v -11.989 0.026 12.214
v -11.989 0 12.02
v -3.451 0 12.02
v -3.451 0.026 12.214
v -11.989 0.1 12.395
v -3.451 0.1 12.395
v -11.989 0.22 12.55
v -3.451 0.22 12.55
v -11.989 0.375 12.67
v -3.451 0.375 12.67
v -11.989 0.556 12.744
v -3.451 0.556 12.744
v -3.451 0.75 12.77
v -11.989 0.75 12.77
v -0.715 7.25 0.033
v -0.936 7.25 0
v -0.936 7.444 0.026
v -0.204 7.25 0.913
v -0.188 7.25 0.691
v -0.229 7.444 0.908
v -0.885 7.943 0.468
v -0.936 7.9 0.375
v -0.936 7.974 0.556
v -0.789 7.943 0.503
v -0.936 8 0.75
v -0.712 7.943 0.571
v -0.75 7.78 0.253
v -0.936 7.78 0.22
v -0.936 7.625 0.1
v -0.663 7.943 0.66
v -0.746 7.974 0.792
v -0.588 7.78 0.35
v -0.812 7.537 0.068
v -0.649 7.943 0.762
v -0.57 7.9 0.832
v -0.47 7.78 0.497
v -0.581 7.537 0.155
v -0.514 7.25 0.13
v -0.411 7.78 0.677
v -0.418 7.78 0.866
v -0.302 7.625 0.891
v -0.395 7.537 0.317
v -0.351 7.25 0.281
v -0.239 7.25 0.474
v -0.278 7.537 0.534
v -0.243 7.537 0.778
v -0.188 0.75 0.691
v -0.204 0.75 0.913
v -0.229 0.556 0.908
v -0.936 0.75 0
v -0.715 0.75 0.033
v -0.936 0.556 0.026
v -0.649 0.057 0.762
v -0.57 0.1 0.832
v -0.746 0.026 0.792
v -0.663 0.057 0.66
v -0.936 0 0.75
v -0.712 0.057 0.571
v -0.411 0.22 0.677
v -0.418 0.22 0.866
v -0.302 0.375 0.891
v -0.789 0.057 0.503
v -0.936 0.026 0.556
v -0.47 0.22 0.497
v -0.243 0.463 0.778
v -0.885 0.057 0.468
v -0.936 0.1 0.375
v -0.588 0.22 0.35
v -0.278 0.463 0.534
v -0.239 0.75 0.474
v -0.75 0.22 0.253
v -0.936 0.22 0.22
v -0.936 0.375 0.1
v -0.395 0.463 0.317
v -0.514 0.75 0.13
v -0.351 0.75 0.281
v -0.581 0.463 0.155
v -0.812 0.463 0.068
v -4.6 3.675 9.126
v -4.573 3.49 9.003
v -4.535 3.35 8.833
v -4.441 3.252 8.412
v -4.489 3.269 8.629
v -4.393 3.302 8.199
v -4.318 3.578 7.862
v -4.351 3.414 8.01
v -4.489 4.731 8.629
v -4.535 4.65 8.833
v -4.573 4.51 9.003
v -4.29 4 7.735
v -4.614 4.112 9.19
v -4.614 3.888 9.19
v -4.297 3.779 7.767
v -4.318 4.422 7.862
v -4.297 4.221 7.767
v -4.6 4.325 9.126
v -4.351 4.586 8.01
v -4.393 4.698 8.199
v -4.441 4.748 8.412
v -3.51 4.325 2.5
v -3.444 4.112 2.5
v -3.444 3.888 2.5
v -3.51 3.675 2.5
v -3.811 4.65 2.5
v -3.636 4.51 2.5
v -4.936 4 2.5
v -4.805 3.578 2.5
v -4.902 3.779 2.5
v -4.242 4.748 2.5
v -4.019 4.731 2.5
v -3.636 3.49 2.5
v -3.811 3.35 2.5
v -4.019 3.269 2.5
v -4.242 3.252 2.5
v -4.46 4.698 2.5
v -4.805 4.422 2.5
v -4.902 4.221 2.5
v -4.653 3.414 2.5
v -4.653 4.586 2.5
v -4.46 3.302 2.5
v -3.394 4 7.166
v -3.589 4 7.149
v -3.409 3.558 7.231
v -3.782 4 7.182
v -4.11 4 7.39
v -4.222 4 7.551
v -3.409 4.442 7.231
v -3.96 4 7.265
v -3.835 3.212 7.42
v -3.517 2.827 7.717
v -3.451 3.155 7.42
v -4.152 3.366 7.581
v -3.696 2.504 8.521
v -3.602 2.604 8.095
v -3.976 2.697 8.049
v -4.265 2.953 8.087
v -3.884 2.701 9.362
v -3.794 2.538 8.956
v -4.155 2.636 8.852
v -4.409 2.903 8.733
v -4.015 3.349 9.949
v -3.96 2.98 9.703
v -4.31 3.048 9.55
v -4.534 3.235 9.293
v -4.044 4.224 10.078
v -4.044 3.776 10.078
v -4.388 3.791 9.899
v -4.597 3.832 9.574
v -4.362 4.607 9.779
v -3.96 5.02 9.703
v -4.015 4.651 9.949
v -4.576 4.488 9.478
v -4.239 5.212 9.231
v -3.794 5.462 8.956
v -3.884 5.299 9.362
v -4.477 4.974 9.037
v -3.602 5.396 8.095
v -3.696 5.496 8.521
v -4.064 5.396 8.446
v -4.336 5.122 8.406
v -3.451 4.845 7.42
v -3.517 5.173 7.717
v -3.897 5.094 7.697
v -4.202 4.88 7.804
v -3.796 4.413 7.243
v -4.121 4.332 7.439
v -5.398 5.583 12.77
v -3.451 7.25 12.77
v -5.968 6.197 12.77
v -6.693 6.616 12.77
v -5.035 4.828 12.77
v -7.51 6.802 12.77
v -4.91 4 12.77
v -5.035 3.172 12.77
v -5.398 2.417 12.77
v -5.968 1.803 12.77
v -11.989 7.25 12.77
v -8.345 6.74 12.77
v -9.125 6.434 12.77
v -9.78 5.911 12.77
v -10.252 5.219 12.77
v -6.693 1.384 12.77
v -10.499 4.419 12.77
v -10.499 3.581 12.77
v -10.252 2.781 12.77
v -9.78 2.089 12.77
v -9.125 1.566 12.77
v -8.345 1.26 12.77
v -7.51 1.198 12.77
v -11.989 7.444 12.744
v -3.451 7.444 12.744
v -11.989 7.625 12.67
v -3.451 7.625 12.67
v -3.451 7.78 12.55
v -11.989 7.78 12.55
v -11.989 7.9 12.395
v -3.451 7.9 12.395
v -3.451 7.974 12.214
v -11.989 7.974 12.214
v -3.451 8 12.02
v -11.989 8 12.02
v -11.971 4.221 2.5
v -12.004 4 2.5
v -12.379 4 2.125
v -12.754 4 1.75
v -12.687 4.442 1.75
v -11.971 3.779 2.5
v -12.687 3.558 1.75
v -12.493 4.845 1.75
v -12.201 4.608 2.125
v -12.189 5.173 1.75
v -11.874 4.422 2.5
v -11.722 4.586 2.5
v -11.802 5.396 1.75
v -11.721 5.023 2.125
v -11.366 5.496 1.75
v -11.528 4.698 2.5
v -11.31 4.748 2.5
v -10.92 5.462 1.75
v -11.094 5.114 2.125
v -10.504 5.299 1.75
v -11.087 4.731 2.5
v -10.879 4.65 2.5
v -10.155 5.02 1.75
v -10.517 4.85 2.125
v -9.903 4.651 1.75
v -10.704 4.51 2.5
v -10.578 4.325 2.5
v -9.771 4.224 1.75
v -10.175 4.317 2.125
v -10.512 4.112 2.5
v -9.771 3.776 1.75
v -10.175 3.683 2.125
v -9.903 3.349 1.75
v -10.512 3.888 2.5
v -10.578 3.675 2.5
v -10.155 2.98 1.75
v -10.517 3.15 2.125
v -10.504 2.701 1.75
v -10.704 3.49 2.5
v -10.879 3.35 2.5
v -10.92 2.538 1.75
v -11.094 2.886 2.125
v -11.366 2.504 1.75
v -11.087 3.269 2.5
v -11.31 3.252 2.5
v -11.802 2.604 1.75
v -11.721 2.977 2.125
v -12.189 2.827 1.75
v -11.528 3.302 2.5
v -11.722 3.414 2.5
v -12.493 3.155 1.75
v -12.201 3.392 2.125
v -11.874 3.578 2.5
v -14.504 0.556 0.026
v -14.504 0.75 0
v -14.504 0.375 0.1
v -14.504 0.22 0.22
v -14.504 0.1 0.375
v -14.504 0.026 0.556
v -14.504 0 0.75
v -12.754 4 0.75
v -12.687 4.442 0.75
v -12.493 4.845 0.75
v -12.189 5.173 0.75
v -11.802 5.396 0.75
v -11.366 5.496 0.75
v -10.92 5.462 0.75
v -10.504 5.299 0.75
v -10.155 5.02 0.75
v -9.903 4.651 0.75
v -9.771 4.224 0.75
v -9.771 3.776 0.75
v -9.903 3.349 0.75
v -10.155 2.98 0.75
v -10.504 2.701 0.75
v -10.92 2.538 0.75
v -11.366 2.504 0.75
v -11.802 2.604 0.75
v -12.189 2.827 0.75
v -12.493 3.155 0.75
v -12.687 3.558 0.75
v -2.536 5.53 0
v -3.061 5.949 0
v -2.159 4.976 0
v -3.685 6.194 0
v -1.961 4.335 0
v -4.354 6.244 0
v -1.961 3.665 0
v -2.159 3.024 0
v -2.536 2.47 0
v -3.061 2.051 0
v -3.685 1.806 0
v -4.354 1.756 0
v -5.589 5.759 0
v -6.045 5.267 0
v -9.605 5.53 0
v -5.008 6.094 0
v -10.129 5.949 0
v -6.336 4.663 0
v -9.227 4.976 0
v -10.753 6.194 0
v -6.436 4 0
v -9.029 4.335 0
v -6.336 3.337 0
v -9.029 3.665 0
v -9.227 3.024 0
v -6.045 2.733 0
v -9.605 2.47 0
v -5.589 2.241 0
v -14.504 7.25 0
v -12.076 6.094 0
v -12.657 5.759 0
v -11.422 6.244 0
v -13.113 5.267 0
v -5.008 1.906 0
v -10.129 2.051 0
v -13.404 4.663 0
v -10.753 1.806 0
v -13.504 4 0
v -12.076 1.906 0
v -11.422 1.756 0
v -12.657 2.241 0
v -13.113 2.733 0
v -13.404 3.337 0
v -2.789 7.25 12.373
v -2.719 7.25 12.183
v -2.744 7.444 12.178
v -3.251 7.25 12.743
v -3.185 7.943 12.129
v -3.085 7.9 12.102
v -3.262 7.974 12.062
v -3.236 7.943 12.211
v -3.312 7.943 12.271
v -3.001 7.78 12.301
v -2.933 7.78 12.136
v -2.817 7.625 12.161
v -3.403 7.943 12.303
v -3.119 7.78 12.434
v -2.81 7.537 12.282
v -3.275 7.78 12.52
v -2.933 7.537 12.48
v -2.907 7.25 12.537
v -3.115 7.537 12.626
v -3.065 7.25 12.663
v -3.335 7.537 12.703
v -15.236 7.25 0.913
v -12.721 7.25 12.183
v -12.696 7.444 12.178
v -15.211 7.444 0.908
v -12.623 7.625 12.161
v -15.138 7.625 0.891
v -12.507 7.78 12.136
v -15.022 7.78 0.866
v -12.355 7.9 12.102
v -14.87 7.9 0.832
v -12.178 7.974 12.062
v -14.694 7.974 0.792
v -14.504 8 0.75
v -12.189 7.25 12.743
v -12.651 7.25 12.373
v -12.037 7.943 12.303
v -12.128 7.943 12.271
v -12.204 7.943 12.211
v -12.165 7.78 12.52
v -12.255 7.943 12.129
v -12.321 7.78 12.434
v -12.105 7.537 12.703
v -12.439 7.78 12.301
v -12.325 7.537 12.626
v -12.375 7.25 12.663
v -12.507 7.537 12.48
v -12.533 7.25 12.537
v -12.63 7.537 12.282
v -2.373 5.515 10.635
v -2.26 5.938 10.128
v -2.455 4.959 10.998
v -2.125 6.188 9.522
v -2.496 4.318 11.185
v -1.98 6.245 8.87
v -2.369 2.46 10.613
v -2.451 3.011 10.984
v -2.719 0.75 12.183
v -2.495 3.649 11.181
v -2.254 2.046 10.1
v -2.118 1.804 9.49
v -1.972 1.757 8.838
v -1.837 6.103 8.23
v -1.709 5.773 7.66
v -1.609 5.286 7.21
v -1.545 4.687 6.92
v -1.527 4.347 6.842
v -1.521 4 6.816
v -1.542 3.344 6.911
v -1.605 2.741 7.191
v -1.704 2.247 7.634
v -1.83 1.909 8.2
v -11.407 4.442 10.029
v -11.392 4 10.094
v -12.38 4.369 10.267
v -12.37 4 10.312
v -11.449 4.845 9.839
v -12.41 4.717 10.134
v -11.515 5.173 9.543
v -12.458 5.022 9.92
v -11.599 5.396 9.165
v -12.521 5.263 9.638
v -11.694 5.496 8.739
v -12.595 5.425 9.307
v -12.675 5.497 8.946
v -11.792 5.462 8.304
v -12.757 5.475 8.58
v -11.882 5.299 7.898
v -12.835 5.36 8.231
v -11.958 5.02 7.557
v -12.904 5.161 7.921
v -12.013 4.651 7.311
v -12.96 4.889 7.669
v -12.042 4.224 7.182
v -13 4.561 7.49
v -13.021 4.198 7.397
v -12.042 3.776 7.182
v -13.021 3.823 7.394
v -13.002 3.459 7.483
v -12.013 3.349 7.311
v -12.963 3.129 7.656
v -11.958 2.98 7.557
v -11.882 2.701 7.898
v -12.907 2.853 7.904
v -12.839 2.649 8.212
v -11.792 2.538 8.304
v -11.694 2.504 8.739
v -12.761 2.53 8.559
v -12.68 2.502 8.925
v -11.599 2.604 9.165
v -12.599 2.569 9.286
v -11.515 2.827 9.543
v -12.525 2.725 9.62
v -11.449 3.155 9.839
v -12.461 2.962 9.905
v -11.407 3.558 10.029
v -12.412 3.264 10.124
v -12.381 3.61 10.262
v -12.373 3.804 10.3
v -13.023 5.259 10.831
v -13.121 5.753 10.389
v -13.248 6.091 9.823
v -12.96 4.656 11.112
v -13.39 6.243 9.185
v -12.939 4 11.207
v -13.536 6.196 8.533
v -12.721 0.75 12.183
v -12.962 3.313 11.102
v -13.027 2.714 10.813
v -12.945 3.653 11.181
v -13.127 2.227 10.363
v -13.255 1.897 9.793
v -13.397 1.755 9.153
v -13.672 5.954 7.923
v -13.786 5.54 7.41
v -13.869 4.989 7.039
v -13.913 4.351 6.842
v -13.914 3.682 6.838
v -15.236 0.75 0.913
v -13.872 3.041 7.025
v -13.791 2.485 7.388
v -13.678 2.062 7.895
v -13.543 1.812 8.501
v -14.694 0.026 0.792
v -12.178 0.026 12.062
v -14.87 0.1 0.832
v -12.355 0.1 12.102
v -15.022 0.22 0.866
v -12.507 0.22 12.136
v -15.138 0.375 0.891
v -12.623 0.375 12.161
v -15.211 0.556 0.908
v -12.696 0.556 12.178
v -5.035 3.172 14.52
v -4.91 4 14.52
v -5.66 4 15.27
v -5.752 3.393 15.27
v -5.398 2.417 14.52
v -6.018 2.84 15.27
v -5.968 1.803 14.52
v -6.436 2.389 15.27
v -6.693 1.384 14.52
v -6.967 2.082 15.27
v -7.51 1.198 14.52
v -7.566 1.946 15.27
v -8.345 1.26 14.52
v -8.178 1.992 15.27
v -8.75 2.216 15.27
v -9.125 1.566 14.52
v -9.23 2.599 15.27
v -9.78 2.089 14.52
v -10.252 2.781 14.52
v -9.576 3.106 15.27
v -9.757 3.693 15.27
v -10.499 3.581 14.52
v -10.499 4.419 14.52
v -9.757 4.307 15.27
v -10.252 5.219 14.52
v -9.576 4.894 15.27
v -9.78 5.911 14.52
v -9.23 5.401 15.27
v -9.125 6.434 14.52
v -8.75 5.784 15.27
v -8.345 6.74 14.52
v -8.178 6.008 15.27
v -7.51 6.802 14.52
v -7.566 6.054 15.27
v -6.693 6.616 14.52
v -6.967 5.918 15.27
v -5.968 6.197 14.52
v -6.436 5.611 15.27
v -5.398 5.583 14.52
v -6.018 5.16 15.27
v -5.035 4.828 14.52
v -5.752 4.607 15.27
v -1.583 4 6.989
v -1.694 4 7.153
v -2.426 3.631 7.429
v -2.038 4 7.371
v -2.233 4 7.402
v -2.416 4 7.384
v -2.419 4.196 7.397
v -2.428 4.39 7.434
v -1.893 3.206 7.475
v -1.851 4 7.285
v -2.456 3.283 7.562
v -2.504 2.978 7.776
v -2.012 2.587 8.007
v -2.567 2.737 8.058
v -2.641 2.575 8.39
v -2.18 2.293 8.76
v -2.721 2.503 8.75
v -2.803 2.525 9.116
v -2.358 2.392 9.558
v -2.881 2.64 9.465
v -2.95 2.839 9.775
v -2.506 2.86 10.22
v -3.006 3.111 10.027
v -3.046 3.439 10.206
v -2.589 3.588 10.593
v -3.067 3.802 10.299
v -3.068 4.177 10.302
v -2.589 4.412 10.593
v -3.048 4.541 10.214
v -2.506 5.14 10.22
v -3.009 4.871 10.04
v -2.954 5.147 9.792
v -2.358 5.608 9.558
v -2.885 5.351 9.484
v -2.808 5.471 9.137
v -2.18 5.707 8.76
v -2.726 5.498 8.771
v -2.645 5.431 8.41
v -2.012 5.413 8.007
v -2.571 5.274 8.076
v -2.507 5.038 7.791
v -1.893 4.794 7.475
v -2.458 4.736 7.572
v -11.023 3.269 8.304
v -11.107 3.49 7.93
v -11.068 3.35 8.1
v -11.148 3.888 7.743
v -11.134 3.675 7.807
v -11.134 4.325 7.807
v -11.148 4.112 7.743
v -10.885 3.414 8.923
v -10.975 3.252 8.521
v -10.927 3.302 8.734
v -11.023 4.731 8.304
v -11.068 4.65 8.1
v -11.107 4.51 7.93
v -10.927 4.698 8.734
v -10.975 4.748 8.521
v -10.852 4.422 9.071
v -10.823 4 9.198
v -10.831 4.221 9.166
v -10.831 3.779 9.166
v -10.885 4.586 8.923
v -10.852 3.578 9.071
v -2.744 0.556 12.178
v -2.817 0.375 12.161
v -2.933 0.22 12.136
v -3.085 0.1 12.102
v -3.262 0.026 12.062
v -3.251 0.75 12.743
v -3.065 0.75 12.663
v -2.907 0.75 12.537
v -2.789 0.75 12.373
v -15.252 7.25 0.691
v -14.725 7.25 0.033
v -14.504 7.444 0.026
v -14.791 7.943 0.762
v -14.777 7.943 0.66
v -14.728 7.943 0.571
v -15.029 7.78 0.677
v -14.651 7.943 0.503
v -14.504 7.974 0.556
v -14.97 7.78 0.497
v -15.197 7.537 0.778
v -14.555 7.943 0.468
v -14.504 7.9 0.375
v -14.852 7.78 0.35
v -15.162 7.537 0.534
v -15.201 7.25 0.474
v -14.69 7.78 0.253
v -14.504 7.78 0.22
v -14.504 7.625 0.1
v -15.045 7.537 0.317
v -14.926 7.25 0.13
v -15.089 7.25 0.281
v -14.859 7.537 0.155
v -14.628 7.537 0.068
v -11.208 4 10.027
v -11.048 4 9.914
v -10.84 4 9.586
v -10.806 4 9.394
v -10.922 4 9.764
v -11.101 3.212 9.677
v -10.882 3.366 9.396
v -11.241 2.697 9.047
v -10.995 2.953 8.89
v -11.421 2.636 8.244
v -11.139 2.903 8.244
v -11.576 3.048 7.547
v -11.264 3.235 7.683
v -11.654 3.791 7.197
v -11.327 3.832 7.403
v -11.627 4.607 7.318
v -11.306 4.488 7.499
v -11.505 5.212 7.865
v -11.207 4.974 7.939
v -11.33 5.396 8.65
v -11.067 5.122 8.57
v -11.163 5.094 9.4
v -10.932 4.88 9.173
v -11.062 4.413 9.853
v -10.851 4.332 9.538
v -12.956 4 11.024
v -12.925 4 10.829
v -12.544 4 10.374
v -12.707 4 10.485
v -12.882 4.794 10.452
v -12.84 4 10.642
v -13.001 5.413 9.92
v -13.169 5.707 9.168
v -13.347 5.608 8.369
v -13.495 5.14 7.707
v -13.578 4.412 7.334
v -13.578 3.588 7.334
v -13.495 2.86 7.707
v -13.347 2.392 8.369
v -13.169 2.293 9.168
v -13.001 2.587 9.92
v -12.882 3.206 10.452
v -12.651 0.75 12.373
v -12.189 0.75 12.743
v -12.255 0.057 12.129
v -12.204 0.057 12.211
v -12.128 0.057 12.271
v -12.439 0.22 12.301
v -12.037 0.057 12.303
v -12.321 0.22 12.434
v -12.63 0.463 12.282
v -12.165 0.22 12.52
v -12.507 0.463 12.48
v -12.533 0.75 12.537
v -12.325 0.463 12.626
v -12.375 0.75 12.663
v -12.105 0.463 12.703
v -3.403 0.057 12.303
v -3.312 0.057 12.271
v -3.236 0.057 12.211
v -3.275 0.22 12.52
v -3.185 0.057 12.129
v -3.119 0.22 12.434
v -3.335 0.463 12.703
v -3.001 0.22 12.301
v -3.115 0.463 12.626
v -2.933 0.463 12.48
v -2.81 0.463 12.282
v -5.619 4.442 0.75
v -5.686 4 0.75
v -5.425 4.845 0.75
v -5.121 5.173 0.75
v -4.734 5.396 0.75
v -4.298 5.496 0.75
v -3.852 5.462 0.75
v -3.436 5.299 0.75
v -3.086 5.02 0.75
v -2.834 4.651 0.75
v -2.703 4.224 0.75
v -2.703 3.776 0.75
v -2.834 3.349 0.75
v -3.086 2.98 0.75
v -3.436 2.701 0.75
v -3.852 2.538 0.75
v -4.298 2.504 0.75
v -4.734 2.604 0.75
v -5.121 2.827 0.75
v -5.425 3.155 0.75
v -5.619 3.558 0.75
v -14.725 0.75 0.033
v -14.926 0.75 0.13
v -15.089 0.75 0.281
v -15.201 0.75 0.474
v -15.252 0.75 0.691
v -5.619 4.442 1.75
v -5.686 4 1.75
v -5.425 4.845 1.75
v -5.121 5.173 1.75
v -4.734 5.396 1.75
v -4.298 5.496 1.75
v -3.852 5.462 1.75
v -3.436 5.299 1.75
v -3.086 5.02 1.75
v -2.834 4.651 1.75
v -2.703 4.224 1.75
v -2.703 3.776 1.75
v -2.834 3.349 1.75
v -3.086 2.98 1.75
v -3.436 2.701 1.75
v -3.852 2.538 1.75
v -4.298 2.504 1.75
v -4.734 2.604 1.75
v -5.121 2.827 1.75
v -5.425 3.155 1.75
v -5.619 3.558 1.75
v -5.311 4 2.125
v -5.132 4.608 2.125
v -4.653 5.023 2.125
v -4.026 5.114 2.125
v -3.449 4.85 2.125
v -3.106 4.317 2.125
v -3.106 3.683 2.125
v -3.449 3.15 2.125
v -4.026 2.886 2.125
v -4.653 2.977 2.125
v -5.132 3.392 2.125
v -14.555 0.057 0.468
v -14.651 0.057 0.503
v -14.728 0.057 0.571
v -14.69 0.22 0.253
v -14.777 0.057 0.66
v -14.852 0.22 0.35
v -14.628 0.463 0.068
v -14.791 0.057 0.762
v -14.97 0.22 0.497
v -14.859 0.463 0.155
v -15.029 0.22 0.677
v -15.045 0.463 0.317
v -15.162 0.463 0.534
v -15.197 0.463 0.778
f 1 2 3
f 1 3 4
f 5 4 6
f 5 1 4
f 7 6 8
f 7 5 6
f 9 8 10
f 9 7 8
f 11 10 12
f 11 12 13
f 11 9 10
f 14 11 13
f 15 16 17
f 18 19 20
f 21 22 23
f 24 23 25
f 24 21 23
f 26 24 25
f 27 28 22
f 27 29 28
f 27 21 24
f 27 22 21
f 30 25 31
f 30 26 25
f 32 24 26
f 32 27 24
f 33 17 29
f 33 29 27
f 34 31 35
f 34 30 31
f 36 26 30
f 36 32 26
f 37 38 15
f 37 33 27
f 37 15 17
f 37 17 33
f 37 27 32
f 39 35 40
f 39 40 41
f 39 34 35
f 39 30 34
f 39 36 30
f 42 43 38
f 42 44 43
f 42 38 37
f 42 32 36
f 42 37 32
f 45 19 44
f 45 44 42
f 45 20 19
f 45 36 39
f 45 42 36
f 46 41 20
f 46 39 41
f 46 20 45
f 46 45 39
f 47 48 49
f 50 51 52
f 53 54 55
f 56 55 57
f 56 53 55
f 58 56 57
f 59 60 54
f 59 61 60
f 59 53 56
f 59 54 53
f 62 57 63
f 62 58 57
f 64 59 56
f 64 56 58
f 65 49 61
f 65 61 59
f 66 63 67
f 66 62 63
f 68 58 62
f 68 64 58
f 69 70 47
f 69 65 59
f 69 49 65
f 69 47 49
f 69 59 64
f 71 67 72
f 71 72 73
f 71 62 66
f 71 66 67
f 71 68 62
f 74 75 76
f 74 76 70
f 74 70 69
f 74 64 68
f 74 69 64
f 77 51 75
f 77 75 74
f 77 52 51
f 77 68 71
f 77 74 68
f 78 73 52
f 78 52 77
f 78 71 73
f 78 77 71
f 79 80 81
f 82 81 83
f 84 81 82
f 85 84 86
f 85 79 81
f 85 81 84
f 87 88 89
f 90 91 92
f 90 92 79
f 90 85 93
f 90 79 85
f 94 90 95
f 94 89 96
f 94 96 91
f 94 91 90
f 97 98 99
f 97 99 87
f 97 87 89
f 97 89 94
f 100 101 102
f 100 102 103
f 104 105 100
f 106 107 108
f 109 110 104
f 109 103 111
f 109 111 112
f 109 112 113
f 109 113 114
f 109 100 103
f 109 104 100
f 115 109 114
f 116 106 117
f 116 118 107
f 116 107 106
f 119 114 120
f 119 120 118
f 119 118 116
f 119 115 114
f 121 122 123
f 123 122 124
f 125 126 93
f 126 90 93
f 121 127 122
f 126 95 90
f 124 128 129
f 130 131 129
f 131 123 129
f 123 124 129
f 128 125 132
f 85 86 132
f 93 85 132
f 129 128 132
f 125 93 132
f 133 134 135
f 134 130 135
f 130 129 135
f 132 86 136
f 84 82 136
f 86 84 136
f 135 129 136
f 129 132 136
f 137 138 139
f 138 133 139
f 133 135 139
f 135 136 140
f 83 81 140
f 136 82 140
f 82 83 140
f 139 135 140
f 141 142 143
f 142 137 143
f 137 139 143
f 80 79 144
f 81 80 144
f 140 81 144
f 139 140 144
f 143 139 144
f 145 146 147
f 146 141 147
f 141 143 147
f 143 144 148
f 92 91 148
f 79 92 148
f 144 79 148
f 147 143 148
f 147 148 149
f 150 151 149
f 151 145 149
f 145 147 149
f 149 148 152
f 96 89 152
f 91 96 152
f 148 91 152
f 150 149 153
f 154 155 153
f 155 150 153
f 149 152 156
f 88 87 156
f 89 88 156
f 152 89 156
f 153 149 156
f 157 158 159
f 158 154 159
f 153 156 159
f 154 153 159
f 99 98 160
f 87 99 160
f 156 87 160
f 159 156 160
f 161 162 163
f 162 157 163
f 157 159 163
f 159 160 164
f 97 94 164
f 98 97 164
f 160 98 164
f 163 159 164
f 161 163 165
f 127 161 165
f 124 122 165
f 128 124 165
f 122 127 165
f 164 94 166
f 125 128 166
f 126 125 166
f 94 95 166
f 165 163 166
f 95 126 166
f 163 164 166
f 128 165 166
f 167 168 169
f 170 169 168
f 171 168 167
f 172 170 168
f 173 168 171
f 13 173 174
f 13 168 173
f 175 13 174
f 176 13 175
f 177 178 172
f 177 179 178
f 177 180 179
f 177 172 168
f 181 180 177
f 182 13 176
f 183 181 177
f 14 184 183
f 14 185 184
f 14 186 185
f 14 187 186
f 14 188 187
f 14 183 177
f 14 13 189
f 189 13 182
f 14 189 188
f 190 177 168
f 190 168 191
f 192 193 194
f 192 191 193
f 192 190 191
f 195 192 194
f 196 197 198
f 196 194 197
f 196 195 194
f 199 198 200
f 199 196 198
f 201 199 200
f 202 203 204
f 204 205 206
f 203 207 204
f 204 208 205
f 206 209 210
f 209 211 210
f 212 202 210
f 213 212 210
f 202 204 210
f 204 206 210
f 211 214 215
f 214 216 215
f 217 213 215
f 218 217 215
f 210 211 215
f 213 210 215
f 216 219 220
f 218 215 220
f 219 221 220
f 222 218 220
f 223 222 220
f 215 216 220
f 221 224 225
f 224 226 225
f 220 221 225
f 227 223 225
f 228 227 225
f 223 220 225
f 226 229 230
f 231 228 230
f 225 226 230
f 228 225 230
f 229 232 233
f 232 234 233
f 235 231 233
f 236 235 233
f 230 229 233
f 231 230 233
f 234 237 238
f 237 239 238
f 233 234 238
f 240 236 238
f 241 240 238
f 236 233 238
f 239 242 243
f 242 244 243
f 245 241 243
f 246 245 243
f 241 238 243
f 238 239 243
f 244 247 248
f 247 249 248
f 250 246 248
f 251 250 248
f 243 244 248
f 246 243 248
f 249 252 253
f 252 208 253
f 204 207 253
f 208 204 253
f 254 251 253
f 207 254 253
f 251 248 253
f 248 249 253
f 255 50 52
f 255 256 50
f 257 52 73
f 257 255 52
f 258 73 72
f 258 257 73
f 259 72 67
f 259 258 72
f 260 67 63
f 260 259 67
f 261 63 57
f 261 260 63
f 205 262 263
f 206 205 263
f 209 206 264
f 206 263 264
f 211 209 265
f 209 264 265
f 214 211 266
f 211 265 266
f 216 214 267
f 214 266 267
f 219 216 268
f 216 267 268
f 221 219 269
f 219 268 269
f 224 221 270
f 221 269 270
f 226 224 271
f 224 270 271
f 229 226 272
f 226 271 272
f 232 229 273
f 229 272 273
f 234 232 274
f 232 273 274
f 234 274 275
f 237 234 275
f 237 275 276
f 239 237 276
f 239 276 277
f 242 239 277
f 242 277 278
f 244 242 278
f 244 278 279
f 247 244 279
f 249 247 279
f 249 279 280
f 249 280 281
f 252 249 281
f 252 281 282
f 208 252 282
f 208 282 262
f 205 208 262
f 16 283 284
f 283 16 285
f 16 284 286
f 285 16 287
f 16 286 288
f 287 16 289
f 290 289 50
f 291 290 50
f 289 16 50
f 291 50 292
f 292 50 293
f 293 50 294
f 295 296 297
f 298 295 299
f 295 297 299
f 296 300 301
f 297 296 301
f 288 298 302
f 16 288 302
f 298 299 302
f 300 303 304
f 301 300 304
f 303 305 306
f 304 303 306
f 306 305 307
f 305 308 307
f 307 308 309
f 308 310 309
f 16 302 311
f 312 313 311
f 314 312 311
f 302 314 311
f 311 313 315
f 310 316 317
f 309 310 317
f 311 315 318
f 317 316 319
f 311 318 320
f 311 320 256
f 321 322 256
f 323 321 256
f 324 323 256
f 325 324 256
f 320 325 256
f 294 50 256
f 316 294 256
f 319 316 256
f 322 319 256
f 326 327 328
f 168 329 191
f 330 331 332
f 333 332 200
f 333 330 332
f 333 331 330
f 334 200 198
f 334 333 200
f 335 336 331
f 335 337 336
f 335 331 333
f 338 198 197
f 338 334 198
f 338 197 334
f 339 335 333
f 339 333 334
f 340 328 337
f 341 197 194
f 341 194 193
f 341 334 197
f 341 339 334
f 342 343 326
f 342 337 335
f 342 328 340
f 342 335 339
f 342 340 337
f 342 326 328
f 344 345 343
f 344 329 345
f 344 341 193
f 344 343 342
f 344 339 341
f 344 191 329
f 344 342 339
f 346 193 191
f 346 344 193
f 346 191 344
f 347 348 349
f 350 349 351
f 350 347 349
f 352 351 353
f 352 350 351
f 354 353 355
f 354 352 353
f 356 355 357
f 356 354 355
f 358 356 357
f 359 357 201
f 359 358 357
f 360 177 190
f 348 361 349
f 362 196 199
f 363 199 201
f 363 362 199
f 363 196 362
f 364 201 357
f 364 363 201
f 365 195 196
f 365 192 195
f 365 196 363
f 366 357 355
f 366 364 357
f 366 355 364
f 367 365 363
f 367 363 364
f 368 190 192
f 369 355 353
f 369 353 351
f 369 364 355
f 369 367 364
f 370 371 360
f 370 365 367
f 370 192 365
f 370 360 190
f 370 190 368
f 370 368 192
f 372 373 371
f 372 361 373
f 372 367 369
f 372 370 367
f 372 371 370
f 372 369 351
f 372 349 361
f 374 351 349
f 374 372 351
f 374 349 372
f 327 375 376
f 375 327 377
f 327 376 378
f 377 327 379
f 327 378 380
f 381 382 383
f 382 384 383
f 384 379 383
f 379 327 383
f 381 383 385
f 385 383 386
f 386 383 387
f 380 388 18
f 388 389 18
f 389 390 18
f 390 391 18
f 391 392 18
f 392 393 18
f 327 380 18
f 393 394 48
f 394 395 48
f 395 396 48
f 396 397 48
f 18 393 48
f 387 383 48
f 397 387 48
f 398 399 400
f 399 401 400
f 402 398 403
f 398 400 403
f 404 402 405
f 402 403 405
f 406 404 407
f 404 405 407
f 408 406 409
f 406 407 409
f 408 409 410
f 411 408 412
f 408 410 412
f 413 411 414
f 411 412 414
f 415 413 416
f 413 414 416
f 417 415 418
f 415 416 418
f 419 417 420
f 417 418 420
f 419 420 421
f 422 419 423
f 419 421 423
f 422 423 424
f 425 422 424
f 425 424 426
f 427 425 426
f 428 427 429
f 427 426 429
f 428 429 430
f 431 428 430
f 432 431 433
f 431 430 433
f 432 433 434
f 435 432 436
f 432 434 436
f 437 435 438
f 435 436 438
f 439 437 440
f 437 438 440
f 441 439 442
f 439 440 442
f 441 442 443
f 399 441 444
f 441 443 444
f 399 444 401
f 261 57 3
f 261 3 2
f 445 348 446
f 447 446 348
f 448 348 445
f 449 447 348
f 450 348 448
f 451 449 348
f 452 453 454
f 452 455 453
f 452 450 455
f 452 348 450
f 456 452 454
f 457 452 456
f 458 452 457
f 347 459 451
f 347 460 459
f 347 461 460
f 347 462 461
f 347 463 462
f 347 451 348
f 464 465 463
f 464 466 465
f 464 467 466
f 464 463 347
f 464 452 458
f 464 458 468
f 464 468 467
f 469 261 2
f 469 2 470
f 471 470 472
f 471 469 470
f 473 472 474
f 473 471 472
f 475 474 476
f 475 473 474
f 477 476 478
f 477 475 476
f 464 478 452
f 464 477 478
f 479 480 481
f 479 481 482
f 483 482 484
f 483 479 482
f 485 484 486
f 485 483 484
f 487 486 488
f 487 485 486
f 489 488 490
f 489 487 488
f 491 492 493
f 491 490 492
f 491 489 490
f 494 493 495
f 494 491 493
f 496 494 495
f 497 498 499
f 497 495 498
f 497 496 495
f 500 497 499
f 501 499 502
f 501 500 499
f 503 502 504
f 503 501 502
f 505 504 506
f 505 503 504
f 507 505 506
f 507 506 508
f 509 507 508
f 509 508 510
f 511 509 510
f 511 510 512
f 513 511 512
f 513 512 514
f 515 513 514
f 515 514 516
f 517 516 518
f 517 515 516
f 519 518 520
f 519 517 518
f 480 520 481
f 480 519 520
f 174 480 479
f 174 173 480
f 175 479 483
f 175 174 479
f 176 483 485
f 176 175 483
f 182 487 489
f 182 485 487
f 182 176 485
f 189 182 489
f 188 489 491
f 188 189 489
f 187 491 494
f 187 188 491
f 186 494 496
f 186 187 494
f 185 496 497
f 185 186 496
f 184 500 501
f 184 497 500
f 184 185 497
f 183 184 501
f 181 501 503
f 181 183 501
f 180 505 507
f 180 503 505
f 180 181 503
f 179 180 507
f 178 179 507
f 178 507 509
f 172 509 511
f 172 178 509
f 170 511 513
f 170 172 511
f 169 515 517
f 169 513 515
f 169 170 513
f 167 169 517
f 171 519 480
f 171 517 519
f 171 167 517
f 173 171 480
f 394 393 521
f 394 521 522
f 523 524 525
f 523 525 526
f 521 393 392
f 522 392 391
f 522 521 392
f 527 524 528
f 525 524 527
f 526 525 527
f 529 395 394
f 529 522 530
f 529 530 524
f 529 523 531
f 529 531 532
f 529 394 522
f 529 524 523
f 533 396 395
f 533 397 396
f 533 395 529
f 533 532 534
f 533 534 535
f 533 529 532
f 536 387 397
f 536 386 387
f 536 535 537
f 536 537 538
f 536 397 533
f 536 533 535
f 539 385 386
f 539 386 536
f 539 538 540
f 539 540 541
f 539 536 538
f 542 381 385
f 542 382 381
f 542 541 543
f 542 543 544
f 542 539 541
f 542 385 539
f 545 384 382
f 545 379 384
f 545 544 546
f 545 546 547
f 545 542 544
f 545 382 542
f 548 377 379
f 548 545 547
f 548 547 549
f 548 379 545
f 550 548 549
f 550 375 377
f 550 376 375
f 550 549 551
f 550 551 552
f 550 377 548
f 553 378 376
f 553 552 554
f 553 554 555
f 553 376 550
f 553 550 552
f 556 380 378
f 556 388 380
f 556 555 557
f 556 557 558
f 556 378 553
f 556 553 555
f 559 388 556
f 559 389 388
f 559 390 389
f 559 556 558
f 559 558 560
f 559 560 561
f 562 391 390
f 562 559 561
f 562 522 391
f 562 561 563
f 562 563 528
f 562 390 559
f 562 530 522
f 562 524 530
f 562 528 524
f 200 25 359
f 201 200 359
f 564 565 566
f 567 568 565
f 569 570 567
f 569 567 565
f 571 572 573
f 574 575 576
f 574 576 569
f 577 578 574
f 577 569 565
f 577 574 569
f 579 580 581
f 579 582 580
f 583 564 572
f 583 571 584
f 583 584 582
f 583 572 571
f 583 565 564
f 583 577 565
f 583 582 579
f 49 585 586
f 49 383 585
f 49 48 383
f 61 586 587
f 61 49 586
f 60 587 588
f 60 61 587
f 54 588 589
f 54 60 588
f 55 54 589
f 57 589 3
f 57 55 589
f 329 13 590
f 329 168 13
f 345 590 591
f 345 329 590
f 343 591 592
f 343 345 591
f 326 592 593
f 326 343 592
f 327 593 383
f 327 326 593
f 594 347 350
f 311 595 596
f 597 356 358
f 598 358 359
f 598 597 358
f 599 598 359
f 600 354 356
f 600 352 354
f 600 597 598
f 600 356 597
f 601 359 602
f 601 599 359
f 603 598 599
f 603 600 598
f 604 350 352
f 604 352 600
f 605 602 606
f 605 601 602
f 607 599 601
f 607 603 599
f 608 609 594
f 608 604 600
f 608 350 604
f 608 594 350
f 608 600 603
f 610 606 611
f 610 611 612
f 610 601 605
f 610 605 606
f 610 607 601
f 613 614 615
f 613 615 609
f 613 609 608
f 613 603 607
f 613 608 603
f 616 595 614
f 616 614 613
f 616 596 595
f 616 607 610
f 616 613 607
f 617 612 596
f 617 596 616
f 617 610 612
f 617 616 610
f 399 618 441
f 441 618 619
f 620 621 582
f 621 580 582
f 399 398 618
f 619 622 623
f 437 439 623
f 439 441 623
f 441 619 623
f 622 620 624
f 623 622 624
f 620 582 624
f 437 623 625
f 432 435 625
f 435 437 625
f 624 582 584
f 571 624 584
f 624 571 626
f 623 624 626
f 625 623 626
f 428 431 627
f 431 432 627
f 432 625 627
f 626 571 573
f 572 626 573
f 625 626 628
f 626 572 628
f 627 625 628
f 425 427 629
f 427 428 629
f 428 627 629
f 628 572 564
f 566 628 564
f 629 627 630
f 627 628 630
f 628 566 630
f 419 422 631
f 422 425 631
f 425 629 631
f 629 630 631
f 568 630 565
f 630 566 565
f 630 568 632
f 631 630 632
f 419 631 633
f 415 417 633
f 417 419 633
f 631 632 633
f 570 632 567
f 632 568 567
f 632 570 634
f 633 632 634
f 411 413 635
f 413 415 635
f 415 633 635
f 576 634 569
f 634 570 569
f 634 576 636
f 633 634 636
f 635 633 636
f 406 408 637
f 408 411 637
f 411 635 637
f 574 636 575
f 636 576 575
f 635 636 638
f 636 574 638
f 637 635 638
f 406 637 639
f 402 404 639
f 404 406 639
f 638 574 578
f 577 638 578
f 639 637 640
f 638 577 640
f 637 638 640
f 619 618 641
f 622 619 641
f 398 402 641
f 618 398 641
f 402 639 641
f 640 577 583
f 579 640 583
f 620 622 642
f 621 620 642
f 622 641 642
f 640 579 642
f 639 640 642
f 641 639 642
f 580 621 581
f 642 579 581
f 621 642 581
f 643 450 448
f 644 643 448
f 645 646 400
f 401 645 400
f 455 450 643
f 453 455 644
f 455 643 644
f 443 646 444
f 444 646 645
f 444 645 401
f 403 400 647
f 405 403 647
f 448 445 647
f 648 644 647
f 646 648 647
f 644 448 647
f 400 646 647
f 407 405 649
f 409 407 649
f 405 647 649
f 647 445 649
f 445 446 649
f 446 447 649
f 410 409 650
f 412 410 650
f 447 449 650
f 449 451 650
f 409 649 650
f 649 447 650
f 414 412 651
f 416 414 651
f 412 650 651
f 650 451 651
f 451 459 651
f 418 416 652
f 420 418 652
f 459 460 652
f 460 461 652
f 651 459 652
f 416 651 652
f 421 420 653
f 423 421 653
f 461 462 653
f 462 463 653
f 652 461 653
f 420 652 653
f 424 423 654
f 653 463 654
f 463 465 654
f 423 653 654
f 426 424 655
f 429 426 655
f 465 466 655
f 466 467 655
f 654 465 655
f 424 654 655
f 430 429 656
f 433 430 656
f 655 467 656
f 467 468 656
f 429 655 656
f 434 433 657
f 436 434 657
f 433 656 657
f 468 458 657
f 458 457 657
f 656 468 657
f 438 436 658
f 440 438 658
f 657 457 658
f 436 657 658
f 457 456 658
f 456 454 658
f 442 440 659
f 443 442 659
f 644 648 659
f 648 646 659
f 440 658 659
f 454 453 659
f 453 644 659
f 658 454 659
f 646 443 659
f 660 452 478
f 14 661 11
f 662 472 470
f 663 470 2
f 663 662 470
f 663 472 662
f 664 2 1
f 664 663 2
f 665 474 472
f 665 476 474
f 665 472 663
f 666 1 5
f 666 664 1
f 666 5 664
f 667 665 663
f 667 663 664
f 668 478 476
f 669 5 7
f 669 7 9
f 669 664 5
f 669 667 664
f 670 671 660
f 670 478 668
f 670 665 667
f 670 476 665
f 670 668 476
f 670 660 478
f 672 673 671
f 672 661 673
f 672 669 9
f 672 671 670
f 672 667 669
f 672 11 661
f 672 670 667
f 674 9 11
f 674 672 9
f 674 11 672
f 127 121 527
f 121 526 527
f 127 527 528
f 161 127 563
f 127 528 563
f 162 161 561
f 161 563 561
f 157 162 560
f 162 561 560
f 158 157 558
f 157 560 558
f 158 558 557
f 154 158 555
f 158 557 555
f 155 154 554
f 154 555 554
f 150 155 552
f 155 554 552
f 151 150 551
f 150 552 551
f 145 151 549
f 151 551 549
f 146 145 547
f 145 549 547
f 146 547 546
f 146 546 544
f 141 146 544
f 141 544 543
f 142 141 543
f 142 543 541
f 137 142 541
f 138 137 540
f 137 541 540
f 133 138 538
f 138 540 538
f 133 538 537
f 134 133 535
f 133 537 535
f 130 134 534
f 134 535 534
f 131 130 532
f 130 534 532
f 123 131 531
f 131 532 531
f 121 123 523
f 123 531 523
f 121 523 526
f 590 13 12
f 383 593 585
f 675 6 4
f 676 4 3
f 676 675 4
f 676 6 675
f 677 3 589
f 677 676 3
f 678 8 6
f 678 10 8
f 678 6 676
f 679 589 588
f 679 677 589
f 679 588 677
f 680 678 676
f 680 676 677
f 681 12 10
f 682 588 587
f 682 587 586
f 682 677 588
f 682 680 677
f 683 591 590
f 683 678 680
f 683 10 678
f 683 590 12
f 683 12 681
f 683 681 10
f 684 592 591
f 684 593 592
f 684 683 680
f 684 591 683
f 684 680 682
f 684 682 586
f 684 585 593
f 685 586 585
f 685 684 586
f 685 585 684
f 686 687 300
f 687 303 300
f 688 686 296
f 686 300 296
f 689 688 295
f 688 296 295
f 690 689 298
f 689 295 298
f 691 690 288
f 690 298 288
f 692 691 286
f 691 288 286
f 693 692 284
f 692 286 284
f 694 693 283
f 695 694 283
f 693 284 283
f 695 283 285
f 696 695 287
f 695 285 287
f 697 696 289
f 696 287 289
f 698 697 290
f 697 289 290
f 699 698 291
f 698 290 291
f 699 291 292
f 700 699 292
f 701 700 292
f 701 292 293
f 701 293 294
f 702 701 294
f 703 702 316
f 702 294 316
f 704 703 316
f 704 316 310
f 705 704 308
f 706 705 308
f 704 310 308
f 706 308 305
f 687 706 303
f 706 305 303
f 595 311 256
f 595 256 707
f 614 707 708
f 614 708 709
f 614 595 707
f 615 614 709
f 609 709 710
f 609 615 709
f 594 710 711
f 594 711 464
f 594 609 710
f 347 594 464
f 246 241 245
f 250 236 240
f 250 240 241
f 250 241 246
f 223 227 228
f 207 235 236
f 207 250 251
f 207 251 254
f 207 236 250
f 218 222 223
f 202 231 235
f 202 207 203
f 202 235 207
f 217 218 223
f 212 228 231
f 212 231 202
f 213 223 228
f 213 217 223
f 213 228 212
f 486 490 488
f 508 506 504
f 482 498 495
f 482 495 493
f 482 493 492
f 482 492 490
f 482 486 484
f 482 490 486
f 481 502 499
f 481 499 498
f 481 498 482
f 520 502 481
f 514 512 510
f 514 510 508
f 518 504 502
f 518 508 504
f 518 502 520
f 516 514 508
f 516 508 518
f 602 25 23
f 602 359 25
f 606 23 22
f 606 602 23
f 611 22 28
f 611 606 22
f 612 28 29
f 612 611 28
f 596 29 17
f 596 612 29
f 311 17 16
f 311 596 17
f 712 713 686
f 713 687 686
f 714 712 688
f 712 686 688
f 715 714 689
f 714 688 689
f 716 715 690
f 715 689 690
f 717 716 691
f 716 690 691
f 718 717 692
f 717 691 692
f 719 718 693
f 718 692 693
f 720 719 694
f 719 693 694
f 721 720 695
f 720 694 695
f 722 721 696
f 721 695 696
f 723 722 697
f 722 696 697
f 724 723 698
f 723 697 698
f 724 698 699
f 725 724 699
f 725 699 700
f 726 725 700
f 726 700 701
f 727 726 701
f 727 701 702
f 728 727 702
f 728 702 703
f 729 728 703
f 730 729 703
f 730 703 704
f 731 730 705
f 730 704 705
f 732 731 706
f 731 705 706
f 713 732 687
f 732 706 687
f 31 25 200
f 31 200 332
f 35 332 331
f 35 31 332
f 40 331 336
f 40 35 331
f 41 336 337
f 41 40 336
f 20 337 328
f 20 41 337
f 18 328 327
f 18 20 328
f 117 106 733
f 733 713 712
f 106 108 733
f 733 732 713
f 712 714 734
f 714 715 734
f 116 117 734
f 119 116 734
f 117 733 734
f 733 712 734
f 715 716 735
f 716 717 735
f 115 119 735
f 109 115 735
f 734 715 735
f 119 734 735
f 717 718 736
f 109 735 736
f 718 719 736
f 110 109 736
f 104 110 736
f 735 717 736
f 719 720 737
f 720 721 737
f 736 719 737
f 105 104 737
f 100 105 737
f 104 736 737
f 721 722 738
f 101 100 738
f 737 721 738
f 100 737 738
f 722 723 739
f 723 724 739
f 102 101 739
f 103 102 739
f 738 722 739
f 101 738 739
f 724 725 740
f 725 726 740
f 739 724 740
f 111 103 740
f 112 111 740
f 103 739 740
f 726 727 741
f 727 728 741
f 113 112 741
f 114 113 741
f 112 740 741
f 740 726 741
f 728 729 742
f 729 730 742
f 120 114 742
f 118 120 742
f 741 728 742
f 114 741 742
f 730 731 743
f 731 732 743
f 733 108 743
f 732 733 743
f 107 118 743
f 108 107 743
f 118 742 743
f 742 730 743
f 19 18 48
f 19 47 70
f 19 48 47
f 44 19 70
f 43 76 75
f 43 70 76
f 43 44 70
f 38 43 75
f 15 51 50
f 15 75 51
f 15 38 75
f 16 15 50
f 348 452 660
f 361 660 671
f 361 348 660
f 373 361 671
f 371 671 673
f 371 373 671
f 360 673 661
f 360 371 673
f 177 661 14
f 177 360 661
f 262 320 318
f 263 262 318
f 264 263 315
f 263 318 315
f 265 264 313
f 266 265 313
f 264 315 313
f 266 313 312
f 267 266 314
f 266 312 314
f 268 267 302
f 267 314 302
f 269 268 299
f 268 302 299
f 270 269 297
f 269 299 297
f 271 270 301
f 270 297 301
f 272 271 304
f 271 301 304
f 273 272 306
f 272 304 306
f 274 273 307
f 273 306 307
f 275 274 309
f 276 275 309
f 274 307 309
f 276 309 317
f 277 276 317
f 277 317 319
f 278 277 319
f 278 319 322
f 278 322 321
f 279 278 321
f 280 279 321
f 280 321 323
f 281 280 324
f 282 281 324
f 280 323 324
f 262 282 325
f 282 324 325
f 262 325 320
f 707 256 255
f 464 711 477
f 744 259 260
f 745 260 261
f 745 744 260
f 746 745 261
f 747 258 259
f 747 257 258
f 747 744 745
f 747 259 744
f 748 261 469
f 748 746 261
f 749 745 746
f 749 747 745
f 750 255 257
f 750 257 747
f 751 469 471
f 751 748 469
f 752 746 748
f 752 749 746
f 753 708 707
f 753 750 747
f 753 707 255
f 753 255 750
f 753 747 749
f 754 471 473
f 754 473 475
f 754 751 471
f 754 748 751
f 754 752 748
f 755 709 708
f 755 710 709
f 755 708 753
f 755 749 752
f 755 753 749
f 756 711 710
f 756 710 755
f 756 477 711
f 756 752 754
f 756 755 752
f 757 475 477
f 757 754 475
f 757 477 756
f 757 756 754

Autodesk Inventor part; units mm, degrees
ref_plane "YZ Plane" through (0, 0, 0) normal (1, 0, 0) x (0, 1, 0)
ref_plane "XZ Plane" through (0, 0, 0) normal (0, 1, 0) x (-1, 0, 0)
ref_plane "XY Plane" through (0, 0, 0) normal (0, 0, 1) x (1, 0, 0)
sketch "Sketch1" plane through (0, 0, 0) normal (0, 1, 0) x (-1, 0, 0)
  line L0 (0, 0) -> (15.44, 0)
  line L1 (2.85, 12.77) -> (12.59, 12.77)
  line L2 (12.59, 12.77) -> (15.44, 0)
  line L3 (2.85, 12.77) -> (0, 0)
  dimension "d0" = 15.44
  dimension "d1" = 9.74
  dimension "d2" = 12.77
extrude "Body" add sketch "Sketch1" along normal blind 8
fillet "Edge" radius 0.75 12 edges at (-12.59, 4, 12.77) (-2.85, 4, 12.77) (0, 4, 0) (-15.44, 4, 0) (-7.72, 0, 0) (-7.72, 8, 0) (-14.015, 0, 6.385) (-7.72, 0, 12.77) (-1.425, 0, 6.385) (-1.425, 8, 6.385) (-7.72, 8, 12.77) (-14.015, 8, 6.385)
sketch "Sketch5" plane through (-11.9889, 0.75, 12.77) normal (0, 0, 1) x (1, 0, 0)
  circle A0 centre (4.2689, 3.25) radius 2.81
  point P0 (11.9889, -0.75)
  dimension "d9" = 5.62
extrude "Head Joint" add sketch "Sketch5" along normal blind 2.5
chamfer "Head Edge" distance 0.75 angle 45 1 edges at (-10.53, 4, 15.27)
sketch "Sketch6" plane through (-0.9358, 0.75, 0) normal (0, 0, -1) x (-1, 0, 0)
  line L0 (13.5683, 6.5) -> (13.5683, 0) projected
  line L1 (0, 0) -> (0, 6.5) projected
  circle A0 centre (3.25, 3.25) radius 1.5
  circle A1 centre (10.3183, 3.25) radius 1.5
  point P0 (-0.9358, -0.75)
  dimension "d15" = 3
  dimension "d16" = 3
  dimension "d17" = 3.25
  dimension "d18" = 3.25
extrude "Leg Joint" cut sketch "Sketch6" against normal blind 2.5
chamfer "Leg Edge" distance 0.75 angle 45 4 edges at (-2.6858, 4, 0) (-9.7542, 4, 0) (-9.7542, 4, 2.5) (-2.6858, 4, 2.5)
sketch "Sketch7" plane through (-0.2038, 0.75, 0.9134) normal (0.976, 0, 0.2178) x (0.2178, 0, -0.976)
  line L0 (-11.5473, 0) -> (-11.5473, 6.5) projected
  circle A0 centre (-8.2973, 3.25) radius 1.5
  point P0 (0.9358, -0.75)
  dimension "d24" = 3
  dimension "d25" = 3.25
extrude "Arm Joint1" cut sketch "Sketch7" against normal blind 2.5
fillet "Arm Edge1" radius 0.75 2 edges at (-4.7798, 4, 9.9304) (-2.3379, 4, 10.4754)
sketch "Sketch8" plane through (-12.7209, 0.75, 12.1834) normal (-0.976, 0, 0.2178) x (0.2178, 0, 0.976)
  line L0 (0, 6.5) -> (0, 0) projected
  circle A0 centre (-3.25, 3.25) radius 1.5
  point P0 (-9.12, -0.75)
  dimension "d29" = 3
  dimension "d30" = 3.25
extrude "Arm Joint2" cut sketch "Sketch8" against normal blind 2.5
fillet "Arm Edge2" radius 0.75 2 edges at (-13.7556, 4, 7.5474) (-11.3136, 4, 7.0024)
properties part number "Lego Body"
